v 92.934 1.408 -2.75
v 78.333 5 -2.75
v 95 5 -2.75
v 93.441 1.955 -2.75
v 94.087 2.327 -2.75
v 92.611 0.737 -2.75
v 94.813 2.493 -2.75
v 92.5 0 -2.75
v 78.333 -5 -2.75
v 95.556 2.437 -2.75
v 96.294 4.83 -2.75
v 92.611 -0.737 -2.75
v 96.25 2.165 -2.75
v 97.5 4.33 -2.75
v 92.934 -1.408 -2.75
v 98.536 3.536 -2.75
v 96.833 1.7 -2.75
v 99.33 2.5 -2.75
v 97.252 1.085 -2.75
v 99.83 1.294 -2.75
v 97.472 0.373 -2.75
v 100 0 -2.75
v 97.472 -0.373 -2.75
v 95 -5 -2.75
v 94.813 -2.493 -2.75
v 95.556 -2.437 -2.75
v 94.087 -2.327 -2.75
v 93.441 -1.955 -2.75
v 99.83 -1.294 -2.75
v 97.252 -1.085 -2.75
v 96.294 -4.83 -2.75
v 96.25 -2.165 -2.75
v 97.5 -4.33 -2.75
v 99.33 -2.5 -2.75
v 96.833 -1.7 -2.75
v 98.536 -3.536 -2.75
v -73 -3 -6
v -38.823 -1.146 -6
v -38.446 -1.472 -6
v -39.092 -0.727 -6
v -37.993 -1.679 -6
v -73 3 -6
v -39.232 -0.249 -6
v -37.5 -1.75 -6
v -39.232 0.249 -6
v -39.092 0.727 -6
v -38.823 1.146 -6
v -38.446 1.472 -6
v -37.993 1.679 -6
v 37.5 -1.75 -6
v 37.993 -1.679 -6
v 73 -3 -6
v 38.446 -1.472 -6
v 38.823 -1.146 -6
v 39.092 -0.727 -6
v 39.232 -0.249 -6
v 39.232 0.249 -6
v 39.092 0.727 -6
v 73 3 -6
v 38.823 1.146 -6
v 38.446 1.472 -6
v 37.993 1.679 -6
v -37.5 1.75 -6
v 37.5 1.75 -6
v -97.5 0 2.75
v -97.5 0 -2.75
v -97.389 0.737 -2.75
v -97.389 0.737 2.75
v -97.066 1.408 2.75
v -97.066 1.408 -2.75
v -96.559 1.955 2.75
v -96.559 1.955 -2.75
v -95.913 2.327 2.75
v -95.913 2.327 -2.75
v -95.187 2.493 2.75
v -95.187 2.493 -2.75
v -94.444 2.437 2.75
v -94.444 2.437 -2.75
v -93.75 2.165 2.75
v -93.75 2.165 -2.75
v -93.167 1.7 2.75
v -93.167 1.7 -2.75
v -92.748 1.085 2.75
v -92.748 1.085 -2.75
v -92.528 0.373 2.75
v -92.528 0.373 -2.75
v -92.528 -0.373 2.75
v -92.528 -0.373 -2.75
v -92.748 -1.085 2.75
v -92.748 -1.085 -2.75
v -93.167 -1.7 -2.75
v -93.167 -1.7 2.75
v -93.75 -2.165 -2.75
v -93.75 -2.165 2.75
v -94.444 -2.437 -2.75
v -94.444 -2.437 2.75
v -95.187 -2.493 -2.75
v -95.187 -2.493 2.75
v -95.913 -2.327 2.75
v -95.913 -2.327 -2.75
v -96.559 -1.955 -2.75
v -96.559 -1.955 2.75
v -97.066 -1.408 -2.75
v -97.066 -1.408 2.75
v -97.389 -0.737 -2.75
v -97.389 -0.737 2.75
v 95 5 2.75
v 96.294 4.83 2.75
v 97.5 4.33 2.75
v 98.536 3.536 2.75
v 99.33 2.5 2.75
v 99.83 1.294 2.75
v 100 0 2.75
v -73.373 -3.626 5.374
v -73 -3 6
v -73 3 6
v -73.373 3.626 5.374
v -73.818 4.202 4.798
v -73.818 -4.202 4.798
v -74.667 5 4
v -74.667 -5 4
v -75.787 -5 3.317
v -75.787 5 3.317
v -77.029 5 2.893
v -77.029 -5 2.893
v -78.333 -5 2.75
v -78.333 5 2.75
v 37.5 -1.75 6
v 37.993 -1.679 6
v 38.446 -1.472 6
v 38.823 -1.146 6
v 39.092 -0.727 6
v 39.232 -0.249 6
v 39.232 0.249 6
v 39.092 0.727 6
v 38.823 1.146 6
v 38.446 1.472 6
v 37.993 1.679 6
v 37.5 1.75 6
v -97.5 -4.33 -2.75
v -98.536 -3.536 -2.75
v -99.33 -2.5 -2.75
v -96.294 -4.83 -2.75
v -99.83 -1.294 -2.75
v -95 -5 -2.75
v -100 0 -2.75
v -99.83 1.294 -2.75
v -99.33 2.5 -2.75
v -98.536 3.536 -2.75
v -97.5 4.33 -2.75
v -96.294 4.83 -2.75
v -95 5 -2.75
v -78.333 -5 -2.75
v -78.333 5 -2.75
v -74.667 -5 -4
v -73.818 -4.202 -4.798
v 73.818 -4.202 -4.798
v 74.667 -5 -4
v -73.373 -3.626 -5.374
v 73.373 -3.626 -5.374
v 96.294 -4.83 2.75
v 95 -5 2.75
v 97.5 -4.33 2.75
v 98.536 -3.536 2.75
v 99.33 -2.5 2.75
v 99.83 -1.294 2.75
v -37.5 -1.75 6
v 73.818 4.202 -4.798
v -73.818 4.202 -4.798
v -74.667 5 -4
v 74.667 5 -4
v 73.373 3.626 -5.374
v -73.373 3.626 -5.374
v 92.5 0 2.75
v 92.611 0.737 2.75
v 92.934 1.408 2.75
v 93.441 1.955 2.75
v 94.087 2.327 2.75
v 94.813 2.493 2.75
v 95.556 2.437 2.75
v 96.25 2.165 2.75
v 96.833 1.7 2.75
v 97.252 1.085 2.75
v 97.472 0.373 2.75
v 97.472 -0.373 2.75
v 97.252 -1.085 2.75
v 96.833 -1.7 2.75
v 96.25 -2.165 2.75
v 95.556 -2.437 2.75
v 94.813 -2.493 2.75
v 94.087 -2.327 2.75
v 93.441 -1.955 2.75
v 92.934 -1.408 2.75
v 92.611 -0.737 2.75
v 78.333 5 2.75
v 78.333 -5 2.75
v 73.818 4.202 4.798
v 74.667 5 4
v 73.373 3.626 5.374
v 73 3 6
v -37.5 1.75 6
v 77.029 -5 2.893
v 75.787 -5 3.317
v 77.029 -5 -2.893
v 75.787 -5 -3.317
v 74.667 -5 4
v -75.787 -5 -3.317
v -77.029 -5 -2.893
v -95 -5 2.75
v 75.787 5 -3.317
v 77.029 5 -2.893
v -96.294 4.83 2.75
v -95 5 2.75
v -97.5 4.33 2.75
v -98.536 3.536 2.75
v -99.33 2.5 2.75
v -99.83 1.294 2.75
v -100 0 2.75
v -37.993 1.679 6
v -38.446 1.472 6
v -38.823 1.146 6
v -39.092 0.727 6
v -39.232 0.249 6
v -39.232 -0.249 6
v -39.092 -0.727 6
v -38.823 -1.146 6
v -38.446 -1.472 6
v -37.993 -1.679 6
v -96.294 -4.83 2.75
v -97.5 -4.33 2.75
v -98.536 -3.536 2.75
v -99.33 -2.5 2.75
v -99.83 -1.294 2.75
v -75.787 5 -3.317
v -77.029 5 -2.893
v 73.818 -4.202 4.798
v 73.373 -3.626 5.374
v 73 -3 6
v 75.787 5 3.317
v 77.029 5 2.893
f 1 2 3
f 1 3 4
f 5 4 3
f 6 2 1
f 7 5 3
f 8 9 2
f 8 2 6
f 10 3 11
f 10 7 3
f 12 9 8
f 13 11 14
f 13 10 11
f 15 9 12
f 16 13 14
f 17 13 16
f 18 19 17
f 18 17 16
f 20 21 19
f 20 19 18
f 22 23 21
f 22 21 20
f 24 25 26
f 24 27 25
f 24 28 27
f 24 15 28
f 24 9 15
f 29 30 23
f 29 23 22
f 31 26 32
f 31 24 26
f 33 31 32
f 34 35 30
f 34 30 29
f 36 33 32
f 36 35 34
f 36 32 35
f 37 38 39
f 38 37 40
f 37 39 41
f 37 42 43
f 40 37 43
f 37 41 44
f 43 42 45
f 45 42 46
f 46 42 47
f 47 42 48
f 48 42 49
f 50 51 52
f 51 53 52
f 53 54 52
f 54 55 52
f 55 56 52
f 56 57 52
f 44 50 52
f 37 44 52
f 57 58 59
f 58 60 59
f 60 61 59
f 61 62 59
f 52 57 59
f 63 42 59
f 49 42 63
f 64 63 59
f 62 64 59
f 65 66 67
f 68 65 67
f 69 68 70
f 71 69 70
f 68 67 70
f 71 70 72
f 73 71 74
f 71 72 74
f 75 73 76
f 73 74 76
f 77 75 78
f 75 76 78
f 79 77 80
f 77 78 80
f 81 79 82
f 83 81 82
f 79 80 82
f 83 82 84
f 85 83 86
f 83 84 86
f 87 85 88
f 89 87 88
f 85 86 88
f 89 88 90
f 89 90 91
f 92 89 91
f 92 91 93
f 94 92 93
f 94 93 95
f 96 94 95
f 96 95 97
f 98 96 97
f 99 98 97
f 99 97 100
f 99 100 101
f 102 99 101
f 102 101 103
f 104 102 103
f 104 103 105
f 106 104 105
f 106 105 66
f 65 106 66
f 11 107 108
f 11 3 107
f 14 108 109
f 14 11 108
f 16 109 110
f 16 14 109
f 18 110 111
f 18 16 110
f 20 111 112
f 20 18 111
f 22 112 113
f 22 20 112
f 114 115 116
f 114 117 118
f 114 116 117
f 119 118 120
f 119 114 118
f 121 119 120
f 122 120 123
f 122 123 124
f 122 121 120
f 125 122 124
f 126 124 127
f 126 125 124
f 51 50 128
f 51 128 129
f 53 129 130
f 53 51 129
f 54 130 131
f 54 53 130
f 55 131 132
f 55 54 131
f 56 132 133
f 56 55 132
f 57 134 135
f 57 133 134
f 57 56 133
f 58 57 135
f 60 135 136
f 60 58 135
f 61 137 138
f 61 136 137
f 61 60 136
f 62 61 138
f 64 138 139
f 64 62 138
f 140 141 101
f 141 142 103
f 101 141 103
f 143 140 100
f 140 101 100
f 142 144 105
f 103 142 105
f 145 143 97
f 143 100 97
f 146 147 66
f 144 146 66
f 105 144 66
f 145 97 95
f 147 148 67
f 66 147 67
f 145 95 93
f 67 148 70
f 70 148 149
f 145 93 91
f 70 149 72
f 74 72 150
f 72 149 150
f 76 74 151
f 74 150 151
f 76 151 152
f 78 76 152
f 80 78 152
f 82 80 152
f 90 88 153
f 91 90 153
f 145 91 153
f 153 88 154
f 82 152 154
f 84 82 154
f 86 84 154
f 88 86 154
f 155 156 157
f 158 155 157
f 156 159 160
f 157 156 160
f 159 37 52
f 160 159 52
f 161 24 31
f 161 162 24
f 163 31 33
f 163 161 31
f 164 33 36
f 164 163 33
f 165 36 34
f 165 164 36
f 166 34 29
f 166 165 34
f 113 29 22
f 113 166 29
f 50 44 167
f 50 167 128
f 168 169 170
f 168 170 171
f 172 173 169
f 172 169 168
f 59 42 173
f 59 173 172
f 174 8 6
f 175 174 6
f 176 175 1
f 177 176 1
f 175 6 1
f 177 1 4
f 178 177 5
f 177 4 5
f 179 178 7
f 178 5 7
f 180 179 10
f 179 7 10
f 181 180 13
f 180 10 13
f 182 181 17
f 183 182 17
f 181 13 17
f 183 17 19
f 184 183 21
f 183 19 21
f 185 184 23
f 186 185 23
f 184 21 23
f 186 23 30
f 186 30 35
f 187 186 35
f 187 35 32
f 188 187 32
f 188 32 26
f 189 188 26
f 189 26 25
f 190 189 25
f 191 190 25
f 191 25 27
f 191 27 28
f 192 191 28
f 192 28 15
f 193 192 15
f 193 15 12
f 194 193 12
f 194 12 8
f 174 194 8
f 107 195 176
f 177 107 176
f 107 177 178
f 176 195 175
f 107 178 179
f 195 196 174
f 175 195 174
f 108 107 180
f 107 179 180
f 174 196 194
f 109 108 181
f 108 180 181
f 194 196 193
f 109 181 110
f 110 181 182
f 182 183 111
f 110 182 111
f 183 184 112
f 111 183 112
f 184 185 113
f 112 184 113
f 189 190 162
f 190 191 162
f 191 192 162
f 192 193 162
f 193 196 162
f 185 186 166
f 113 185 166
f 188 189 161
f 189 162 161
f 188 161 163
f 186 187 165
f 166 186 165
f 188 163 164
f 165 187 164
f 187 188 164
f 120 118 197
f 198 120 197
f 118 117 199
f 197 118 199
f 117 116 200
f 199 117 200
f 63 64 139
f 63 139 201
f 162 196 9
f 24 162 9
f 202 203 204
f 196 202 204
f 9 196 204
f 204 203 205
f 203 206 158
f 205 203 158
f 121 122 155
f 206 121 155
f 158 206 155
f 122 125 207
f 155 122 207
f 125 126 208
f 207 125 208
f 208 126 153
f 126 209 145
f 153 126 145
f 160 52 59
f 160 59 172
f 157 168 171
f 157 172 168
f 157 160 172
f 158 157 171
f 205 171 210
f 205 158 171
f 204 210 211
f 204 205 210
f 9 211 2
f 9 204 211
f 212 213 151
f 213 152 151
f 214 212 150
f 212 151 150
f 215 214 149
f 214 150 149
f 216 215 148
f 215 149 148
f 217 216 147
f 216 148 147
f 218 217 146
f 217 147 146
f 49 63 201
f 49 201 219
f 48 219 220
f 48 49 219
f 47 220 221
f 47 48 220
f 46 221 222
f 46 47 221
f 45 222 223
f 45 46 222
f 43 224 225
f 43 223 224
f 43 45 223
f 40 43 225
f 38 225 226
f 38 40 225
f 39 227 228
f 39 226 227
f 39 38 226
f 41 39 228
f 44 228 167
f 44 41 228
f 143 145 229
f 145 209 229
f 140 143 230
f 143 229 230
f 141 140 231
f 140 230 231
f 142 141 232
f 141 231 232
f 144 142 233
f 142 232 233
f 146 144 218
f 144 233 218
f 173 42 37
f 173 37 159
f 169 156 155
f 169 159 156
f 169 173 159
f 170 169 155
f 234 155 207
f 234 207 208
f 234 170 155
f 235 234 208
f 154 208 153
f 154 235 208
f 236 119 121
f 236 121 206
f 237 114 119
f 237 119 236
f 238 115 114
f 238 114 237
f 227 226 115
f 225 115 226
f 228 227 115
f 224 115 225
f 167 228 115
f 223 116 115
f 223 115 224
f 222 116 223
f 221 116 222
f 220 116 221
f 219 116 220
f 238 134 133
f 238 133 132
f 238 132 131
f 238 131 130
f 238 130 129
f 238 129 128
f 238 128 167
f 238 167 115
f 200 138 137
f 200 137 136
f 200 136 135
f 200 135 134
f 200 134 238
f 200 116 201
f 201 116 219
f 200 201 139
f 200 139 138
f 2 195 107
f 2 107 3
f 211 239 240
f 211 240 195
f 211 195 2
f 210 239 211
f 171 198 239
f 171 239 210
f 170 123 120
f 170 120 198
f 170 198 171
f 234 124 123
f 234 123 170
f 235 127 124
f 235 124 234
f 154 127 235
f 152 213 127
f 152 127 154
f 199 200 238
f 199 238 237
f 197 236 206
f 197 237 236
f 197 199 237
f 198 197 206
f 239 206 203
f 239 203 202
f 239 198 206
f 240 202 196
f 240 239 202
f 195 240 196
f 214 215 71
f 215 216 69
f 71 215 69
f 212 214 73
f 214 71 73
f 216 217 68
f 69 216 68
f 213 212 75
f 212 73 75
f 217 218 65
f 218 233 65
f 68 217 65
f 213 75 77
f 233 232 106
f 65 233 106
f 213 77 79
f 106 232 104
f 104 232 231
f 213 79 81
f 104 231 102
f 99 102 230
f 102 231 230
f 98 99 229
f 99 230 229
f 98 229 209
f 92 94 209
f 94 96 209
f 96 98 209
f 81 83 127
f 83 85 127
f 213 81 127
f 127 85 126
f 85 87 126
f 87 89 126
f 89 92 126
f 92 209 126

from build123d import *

# Parameters (mm, degrees)
SKETCH1_W           = 200
SKETCH1_H           = 10
BOSS_EXTRUDE1_DEPTH = 6
SKETCH2_W           = 54
SKETCH2_H           = 6.5
CUT_EXTRUDE1_DEPTH  = 15.5
FILLET1_R           = 6
FILLET2_R           = 5
CHAMFER1_SIZE       = 2
CUT_EXTRUDE2_DEPTH  = 31
SKETCH4_R           = 2.5
CUT_EXTRUDE3_DEPTH  = 31


# Some blends are built 0.0001 mm under size
with BuildPart() as part:
    # Sketch1 → Boss-Extrude1 (new, symmetric)
    with BuildSketch(Plane.XY):
        Rectangle(SKETCH1_W, SKETCH1_H)
    extrude(amount=BOSS_EXTRUDE1_DEPTH, both=True)

    # Sketch2 → Cut-Extrude1 (cut, symmetric)
    with BuildSketch(Plane(origin=(0, 0, 0), x_dir=(1, 0, 0), z_dir=(0, 1, 0))):
        with Locations((100, 6)):
            Rectangle(SKETCH2_W, SKETCH2_H)
        with Locations((100, -6)):
            Rectangle(SKETCH2_W, SKETCH2_H)
        with Locations((-100, -6)):
            Rectangle(SKETCH2_W, SKETCH2_H)
        with Locations((-100, 6)):
            Rectangle(SKETCH2_W, SKETCH2_H)
    extrude(amount=CUT_EXTRUDE1_DEPTH, both=True, mode=Mode.SUBTRACT)

    # Fillet1
    # the kernel refuses this fillet: 6 mm, written as the material it adds along each edge
    with BuildSketch(Plane(origin=(73, -5, -2.75), x_dir=(1, 0, 0), z_dir=(0, 1, 0)), Plane(origin=(-73, -5, 2.75), x_dir=(-1, 0, 0), z_dir=(0, 1, 0))) as fillet1_piece_1:
        with BuildLine():
            CenterArc((5.332682252, 6), FILLET1_R, 207.279612736, 62.720387264)
            Line((0, 3.25), (-0.106653645, 3.195))
            ThreePointArc((-0.106653645, 3.195), (-0.12, 1.625), (-0.12, 0))
            Line((-0.12, 0), (0, -0.12))
            Line((0, -0.12), (5.332682252, -0.12))
            Line((5.332682252, -0.12), (5.332682252, 0))
        make_face()
    extrude(amount=10)
    with BuildSketch(Plane(origin=(73, 5, 2.75), x_dir=(0, 0, 1), z_dir=(0, -1, 0)), Plane(origin=(-73, 5, -2.75), x_dir=(0, 0, -1), z_dir=(0, -1, 0))) as fillet1_piece_2:
        with BuildLine():
            CenterArc((6, -5.332682252), FILLET1_R, 117.279612736, 62.720387264)
            Line((0, -5.332682252), (-0.12, -5.332682252))
            Line((-0.12, -5.332682252), (-0.12, 0))
            Line((-0.12, 0), (0, 0.12))
            ThreePointArc((0, 0.12), (1.625, 0.12), (3.195, 0.106653645))
            Line((3.195, 0.106653645), (3.25, 0))
        make_face()
    extrude(amount=10)

    # Fillet2
    fillet2_edges = [part.edges().sort_by_distance(p)[0] for p in [
        (-100, -5, 0),
        (-100, 5, 0),
        (100, -5, 0),
        (100, 5, 0),
    ]]
    fillet(fillet2_edges, radius=FILLET2_R - 0.0001)  # a hair under: the kernel refuses the full size

    # Chamfer1
    chamfer1_edges = [part.edges().sort_by_distance(p)[0] for p in [
        (0, -5, -6),
        (0, 5, -6),
        (0, 5, 6),
        (0, -5, 6),
    ]]
    chamfer(chamfer1_edges, length=CHAMFER1_SIZE)

    # Sketch3 → Cut-Extrude2 (cut)
    with BuildSketch(Plane(origin=(0, 0, -6), x_dir=(-1, 0, 0), z_dir=(0, 0, -1))):
        with BuildLine():
            Line((-37.5, 1.75), (37.5, 1.75))
            ThreePointArc((37.5, 1.75), (39.25, 0), (37.5, -1.75))
            Line((37.5, -1.75), (-37.5, -1.75))
            ThreePointArc((-37.5, -1.75), (-39.25, 0), (-37.5, 1.75))
        make_face()
    extrude(amount=-CUT_EXTRUDE2_DEPTH, mode=Mode.SUBTRACT)

    # Sketch4 → Cut-Extrude3 (cut)
    with BuildSketch(Plane(origin=(0, 0, -2.75), x_dir=(-1, 0, 0), z_dir=(0, 0, -1))):
        with Locations((95, 0)):
            Circle(SKETCH4_R)
        with Locations((-95, 0)):
            Circle(SKETCH4_R)
    extrude(amount=-CUT_EXTRUDE3_DEPTH, mode=Mode.SUBTRACT)


solid = part.part
